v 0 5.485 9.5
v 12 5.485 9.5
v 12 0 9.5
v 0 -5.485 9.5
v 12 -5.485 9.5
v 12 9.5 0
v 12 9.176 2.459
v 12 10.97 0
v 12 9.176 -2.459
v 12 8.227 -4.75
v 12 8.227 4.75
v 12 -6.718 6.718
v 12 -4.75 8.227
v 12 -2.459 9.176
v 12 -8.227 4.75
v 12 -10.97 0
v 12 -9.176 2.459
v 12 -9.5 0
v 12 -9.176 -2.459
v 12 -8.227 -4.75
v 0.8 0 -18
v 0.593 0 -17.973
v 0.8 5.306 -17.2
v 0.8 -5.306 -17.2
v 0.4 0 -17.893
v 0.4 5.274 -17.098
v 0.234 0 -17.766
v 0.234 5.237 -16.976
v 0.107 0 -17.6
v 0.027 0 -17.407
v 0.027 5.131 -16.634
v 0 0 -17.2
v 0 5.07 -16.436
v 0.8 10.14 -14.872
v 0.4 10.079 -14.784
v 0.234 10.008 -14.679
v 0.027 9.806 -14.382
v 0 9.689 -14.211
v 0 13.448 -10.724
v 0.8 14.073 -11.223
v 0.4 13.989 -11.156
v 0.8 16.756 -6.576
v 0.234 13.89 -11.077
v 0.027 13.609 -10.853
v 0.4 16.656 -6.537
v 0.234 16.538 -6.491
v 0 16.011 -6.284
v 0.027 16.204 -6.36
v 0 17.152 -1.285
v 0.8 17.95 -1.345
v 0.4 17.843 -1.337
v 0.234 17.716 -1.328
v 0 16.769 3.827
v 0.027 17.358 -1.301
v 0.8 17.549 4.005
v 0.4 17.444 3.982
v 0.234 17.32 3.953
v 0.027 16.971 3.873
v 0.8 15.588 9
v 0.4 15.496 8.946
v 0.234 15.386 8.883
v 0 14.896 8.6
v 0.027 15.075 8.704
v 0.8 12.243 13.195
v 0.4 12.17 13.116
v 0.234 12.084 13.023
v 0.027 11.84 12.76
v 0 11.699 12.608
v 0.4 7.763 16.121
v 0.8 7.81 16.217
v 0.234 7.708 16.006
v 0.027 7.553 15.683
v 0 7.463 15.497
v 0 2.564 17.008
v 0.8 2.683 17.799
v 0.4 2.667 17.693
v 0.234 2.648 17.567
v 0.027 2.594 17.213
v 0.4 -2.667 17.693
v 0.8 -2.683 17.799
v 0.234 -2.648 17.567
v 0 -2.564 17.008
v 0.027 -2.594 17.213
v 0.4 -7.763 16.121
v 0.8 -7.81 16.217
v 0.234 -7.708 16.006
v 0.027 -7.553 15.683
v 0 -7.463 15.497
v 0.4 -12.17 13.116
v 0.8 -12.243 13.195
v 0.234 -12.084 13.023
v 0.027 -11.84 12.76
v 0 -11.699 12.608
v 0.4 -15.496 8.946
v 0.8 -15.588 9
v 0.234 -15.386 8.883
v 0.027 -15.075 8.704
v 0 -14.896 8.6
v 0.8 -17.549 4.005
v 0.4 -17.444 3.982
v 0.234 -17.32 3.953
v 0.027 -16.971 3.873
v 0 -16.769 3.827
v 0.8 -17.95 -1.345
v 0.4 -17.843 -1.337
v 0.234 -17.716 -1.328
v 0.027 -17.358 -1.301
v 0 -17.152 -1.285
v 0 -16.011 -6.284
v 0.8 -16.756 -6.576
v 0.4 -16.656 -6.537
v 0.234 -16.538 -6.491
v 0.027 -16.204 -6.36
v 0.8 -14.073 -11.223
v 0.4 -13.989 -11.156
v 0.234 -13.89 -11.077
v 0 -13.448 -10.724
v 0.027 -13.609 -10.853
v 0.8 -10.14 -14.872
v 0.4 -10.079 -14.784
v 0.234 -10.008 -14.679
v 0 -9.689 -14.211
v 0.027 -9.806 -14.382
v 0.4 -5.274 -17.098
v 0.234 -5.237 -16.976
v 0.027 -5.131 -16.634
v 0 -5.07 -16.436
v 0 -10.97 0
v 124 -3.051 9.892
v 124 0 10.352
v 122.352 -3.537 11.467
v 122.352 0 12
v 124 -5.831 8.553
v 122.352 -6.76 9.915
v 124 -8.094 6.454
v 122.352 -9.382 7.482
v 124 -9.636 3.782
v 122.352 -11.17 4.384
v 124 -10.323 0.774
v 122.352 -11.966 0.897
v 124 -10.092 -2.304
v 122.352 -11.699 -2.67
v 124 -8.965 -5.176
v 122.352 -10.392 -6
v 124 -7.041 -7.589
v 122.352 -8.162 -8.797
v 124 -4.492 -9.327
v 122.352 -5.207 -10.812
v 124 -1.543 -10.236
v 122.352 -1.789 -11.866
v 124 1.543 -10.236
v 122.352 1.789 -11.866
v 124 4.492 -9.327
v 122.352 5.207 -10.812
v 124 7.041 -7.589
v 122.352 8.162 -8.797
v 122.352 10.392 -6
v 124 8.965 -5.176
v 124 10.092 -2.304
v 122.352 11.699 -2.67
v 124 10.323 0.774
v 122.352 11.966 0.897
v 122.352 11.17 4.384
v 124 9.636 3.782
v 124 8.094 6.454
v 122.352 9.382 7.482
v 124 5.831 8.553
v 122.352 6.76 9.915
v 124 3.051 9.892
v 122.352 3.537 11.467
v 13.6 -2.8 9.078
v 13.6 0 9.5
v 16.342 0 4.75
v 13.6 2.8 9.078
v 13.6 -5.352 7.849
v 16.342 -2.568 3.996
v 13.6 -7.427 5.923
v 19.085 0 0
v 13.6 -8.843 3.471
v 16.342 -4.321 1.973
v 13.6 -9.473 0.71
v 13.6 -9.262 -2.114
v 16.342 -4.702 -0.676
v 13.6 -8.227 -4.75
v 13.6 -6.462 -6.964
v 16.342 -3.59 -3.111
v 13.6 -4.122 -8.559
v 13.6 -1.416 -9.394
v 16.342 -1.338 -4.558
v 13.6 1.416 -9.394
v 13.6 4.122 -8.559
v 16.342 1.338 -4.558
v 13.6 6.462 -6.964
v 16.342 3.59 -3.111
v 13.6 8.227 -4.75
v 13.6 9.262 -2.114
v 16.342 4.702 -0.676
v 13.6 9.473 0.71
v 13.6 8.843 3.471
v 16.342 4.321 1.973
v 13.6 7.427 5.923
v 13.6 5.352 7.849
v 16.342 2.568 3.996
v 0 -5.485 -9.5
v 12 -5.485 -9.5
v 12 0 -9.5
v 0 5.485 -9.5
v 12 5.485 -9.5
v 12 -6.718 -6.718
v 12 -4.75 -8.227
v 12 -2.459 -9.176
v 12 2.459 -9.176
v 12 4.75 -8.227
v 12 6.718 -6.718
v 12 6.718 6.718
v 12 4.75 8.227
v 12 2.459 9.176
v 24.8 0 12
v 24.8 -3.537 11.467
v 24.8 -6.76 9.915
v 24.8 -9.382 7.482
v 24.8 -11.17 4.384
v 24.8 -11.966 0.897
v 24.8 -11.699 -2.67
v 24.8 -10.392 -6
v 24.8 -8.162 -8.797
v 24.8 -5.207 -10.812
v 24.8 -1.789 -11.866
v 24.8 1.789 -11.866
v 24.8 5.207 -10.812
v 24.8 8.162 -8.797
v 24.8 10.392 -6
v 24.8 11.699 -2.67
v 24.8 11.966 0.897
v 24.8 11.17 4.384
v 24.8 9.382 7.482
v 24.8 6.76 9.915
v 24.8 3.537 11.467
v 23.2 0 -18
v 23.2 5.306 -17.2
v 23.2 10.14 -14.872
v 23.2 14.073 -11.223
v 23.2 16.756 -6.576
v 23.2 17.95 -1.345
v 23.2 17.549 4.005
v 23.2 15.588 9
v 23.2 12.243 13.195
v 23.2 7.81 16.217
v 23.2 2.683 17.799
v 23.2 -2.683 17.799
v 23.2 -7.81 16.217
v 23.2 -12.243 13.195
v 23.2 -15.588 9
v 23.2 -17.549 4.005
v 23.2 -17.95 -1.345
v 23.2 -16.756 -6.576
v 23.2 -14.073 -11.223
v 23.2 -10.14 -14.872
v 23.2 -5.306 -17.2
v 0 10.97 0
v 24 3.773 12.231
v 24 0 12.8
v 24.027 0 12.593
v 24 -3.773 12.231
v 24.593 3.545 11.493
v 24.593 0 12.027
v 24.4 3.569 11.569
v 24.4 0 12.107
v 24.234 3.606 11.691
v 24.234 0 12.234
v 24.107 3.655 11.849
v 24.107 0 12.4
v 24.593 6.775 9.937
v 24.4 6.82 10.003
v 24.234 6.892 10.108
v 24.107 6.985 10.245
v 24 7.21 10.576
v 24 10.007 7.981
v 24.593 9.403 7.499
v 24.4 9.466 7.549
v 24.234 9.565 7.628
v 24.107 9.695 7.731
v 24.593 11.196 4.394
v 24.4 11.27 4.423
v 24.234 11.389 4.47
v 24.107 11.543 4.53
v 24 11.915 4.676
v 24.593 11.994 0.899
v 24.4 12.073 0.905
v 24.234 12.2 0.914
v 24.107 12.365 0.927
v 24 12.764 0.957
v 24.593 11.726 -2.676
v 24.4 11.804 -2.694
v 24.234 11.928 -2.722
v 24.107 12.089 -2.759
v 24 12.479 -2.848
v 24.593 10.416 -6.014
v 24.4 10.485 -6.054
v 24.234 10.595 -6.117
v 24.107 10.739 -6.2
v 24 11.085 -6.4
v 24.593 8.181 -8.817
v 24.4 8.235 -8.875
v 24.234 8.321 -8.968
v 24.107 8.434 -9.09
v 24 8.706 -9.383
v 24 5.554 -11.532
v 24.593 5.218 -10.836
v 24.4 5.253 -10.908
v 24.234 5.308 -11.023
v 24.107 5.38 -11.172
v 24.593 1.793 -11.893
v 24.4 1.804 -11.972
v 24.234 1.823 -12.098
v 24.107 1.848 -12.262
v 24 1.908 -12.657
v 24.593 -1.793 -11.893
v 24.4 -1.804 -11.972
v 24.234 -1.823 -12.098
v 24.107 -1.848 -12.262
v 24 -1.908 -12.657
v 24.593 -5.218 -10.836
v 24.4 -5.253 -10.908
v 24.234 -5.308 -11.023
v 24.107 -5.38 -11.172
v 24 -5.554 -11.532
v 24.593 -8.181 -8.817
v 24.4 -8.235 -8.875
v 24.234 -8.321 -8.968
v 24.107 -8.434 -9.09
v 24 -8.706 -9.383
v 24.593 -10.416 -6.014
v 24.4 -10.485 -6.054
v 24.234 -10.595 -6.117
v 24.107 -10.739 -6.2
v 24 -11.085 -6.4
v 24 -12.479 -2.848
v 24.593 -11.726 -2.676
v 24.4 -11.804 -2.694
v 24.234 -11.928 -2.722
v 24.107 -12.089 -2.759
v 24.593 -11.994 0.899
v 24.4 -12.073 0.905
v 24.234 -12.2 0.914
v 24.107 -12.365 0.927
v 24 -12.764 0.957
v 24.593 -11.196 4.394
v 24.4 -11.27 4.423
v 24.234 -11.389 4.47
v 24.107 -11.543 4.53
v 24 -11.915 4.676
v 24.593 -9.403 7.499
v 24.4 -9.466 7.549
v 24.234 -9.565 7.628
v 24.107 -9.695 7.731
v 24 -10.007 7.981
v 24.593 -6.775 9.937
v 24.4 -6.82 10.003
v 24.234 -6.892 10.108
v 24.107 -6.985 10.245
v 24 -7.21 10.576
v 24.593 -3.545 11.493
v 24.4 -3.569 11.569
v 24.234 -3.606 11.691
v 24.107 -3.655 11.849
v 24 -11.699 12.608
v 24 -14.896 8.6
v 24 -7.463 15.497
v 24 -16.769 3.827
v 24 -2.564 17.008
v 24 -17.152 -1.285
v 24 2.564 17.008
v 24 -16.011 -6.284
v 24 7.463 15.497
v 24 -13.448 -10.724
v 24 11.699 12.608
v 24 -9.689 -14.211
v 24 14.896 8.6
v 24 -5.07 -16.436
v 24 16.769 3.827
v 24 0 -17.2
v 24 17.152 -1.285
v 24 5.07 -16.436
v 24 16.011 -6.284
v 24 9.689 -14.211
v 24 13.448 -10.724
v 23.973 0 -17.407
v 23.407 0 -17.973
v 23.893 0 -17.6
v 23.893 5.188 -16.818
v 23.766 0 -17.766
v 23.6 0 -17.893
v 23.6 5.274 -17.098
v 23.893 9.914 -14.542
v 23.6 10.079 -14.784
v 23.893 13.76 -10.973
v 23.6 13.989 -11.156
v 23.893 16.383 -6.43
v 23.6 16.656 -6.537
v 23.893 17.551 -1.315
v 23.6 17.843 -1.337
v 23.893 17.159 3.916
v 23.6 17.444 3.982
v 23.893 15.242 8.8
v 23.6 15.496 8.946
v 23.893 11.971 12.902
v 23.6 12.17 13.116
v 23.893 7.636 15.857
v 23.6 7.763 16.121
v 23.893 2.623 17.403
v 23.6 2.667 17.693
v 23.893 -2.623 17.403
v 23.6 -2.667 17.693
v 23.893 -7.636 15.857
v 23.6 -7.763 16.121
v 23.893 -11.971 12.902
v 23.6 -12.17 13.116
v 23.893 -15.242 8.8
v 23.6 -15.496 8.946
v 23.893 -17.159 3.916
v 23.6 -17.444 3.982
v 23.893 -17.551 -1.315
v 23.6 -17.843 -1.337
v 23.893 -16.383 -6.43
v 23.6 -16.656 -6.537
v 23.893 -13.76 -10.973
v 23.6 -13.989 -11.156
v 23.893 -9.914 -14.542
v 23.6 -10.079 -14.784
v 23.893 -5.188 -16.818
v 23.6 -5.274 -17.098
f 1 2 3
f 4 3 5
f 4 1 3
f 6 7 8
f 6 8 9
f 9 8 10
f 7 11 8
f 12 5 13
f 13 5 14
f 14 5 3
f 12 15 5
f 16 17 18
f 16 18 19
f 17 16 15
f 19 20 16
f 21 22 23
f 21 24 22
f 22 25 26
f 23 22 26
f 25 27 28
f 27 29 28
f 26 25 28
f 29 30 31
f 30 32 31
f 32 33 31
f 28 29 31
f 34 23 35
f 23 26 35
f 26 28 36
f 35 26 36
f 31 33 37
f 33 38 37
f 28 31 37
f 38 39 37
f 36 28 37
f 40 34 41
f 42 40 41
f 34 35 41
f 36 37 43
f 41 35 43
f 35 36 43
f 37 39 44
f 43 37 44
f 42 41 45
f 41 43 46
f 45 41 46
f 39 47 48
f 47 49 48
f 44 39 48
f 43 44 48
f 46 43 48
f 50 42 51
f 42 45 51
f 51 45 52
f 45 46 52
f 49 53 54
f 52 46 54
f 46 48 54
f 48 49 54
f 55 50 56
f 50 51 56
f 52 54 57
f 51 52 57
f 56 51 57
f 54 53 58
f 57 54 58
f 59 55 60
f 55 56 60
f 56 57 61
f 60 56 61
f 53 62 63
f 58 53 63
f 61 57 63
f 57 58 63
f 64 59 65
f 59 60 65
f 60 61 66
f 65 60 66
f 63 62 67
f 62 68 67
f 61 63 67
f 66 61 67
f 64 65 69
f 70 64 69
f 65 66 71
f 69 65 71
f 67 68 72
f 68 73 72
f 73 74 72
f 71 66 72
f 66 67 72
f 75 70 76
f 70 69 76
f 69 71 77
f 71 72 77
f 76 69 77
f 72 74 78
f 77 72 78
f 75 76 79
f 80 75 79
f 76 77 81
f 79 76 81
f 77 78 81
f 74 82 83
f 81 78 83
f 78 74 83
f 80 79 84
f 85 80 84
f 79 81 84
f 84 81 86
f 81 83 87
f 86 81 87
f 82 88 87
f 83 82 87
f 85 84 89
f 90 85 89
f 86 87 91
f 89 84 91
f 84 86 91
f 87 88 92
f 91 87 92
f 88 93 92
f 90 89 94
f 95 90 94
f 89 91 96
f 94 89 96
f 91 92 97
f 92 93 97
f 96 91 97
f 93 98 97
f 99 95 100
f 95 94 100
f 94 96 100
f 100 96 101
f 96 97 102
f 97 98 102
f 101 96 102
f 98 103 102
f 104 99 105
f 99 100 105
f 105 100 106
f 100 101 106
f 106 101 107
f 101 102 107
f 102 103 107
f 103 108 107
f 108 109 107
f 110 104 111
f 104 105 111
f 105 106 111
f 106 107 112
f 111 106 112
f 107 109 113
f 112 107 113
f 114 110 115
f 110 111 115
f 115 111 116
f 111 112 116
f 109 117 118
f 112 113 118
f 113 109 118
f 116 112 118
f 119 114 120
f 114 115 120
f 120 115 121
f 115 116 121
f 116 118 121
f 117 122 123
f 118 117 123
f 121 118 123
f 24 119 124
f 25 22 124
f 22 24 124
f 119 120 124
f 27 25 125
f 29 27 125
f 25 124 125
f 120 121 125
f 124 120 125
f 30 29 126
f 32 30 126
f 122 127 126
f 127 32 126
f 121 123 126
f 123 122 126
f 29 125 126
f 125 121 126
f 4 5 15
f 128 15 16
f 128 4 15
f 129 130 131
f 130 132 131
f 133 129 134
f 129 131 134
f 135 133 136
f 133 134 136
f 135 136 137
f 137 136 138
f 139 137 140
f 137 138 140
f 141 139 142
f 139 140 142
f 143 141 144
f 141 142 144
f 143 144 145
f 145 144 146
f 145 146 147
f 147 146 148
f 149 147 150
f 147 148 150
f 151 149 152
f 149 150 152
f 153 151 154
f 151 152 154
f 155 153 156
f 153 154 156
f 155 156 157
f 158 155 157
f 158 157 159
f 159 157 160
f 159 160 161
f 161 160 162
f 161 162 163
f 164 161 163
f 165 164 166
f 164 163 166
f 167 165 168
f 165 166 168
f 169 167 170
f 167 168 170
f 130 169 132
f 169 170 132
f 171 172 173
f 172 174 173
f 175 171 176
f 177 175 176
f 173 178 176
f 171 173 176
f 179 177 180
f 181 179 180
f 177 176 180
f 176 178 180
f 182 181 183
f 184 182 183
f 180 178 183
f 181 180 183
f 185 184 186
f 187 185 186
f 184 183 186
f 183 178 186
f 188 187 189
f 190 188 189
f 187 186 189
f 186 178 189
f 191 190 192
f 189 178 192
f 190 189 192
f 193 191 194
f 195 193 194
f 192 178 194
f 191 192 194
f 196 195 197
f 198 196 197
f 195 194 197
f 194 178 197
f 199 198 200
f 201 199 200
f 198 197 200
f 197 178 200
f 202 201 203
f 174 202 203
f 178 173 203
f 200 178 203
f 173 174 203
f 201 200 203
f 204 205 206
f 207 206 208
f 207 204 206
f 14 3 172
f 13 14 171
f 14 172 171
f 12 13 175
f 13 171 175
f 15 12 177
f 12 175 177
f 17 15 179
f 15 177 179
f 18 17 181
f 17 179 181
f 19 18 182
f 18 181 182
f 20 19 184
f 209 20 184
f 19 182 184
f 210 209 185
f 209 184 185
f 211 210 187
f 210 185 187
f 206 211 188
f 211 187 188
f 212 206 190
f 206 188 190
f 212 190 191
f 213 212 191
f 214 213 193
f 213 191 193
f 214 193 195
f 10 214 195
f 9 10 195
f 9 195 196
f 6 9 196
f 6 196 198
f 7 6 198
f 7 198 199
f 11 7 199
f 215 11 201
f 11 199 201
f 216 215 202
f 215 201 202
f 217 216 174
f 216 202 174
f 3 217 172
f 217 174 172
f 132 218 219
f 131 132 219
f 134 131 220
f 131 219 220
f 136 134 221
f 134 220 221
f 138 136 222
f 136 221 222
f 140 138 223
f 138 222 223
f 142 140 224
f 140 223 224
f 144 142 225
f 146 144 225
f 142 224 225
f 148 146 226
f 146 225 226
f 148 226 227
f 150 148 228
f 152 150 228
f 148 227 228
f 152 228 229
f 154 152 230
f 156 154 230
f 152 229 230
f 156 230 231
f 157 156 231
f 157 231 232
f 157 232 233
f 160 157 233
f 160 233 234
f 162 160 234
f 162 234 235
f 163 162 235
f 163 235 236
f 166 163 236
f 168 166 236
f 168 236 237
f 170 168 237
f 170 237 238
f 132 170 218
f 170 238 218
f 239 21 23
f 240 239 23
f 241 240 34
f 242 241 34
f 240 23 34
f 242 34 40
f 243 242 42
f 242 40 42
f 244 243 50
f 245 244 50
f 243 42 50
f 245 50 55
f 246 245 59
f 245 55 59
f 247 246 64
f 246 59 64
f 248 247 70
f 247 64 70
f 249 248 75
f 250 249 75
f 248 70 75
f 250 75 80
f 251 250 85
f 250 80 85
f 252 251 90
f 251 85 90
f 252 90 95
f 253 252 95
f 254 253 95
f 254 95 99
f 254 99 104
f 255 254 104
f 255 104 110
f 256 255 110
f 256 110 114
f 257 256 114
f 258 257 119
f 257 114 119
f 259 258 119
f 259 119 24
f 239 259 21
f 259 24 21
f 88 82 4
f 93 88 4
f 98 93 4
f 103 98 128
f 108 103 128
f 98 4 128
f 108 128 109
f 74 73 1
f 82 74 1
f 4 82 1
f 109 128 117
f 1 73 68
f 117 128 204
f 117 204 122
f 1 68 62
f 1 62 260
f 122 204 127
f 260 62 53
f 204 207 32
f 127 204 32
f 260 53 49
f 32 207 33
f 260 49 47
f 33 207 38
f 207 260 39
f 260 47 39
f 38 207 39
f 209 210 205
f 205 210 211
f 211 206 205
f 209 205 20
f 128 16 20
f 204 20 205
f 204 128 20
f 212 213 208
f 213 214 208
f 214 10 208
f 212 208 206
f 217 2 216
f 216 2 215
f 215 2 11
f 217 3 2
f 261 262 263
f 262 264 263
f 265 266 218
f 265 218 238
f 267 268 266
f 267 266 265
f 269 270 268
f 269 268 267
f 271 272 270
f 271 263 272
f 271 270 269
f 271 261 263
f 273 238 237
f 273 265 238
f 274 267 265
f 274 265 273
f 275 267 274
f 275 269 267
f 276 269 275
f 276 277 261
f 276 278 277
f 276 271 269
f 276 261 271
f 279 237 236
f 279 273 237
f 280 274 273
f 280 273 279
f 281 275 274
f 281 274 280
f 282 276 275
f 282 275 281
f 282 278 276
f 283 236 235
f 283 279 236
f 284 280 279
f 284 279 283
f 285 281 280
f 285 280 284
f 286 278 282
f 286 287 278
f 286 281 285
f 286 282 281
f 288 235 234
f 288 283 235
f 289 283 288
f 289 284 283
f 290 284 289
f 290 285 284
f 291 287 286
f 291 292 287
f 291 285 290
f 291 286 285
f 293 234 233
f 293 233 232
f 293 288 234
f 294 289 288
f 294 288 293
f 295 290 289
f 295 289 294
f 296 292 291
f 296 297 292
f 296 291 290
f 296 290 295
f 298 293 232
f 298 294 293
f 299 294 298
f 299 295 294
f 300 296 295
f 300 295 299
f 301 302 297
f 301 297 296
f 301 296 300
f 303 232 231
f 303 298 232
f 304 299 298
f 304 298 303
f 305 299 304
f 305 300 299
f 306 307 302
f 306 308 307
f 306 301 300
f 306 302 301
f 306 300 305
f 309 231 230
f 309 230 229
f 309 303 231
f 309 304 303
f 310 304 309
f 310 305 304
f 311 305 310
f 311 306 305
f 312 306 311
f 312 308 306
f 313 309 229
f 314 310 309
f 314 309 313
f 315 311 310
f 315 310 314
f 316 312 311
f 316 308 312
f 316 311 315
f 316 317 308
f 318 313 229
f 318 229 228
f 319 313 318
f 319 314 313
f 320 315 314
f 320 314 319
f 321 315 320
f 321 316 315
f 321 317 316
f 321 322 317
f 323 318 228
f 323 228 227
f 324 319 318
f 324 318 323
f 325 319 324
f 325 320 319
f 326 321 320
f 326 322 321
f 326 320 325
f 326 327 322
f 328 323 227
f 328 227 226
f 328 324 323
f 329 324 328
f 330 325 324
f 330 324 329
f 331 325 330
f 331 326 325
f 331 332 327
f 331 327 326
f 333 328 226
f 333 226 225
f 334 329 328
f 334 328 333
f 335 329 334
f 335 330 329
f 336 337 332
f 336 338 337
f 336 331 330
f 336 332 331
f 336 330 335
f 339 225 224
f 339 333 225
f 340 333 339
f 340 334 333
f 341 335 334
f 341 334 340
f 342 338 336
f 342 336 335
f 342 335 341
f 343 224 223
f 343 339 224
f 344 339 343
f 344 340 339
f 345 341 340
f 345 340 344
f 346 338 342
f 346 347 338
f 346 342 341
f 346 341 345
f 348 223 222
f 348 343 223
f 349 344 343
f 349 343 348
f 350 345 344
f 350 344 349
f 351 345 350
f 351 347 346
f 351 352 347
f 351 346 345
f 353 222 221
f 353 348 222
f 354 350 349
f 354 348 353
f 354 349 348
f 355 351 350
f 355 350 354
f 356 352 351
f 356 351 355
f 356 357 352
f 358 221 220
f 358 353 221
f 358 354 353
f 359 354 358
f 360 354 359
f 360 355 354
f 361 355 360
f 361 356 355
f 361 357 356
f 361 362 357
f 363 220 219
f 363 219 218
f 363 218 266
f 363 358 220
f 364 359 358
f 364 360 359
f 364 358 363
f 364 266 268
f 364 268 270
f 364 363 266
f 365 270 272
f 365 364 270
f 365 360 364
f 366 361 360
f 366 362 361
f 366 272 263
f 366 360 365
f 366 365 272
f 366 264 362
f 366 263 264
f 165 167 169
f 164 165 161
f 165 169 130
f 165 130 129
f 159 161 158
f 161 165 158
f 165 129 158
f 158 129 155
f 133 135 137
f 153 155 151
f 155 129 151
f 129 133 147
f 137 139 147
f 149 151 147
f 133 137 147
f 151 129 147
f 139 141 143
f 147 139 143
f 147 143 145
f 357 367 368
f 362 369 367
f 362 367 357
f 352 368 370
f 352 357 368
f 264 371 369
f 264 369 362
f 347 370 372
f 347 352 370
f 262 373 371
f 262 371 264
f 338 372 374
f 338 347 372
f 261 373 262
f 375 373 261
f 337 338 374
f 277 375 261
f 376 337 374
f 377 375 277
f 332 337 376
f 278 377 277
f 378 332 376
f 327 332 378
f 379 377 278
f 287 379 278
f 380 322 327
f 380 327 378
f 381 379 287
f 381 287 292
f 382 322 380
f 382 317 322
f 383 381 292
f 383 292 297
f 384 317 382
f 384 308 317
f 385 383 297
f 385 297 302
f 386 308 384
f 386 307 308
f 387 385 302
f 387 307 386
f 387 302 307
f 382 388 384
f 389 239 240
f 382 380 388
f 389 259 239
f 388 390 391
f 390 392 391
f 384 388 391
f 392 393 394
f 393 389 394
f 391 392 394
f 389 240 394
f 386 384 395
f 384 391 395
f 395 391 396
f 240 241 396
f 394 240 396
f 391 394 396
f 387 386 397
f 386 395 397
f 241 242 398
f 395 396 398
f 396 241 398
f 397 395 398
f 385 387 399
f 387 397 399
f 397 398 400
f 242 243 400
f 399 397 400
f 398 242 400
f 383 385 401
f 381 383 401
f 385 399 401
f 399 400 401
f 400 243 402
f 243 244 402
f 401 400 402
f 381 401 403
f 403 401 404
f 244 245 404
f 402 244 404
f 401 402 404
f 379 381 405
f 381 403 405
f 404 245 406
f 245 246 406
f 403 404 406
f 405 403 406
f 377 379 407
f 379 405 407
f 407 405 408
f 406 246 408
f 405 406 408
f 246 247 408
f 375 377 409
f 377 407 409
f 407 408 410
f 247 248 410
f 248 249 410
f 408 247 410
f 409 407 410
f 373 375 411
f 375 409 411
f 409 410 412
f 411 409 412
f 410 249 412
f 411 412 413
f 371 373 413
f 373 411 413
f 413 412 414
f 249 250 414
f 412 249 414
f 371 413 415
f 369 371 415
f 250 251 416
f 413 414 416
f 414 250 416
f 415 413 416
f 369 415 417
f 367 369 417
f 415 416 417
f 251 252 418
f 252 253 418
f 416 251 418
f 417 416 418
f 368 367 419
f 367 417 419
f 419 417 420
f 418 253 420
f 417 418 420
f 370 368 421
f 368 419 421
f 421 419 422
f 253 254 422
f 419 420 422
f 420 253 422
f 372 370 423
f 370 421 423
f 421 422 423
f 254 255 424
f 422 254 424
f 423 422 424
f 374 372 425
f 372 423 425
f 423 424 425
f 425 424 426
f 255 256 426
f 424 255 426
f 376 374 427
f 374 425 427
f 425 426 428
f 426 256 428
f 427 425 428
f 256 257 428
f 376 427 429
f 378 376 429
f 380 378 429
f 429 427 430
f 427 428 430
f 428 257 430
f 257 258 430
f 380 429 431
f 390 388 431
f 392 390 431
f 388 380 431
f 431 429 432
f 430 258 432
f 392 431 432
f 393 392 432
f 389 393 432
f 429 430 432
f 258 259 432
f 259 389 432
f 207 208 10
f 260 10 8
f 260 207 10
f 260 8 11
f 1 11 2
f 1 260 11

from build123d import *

# Parameters (mm, degrees)
BASEHEADSKE_R   = 18
BASEHEAD_DEPTH  = 24
CUTSOCKET_DEPTH = 12
FILLET_2_R      = 0.8


with BuildPart() as part:
    # BaseHeadSke → BaseHead (new body)
    with BuildSketch(Plane(origin=(0, 0, 0), x_dir=(0, 0, -1), z_dir=(1, 0, 0))):
        Circle(BASEHEADSKE_R)
    extrude(amount=BASEHEAD_DEPTH)

    # BodySke → BaseBody (revolve)
    with BuildSketch(Plane.XY, mode=Mode.PRIVATE) as basebody_sk:
        Polygon((0, 0), (124, 0), (124, 10.352), (122.352, 12), (0, 12), align=None)
    revolve(basebody_sk.sketch.rotate(Axis((0, 0, 0), (1, 0, 0)), 90), axis=Axis((0, 0, 0), (1, 0, 0)))

    # CutSocketSke → CutSocket (cut)
    with BuildSketch(Plane(origin=(0, 0, 0), x_dir=(0, 0, -1), z_dir=(1, 0, 0))):
        Polygon((0, 10.969655115), (-9.5, 5.484827557), (-9.5, -5.484827557), (0, -10.969655115), (9.5, -5.484827557), (9.5, 5.484827557), align=None)
    extrude(amount=CUTSOCKET_DEPTH, mode=Mode.SUBTRACT)

    # CutHoleSke → CutHole (revolve, cut)
    with BuildSketch(Plane.XY, mode=Mode.PRIVATE) as cuthole_sk:
        Polygon((0, 9.5), (13.6, 9.5), (19.084827557, 0), (0, 0), align=None)
    revolve(cuthole_sk.sketch.rotate(Axis((0, 0, 0), (1, 0, 0)), 90), axis=Axis((0, 0, 0), (1, 0, 0)), mode=Mode.SUBTRACT)

    # Fillet 2
    fillet_2_edges = [part.edges().sort_by_distance(p)[0] for p in [
        (0, 0, 18),
        (24, 0, 18),
        (24, 0, -12),
    ]]
    fillet(fillet_2_edges, radius=FILLET_2_R)


solid = part.part
